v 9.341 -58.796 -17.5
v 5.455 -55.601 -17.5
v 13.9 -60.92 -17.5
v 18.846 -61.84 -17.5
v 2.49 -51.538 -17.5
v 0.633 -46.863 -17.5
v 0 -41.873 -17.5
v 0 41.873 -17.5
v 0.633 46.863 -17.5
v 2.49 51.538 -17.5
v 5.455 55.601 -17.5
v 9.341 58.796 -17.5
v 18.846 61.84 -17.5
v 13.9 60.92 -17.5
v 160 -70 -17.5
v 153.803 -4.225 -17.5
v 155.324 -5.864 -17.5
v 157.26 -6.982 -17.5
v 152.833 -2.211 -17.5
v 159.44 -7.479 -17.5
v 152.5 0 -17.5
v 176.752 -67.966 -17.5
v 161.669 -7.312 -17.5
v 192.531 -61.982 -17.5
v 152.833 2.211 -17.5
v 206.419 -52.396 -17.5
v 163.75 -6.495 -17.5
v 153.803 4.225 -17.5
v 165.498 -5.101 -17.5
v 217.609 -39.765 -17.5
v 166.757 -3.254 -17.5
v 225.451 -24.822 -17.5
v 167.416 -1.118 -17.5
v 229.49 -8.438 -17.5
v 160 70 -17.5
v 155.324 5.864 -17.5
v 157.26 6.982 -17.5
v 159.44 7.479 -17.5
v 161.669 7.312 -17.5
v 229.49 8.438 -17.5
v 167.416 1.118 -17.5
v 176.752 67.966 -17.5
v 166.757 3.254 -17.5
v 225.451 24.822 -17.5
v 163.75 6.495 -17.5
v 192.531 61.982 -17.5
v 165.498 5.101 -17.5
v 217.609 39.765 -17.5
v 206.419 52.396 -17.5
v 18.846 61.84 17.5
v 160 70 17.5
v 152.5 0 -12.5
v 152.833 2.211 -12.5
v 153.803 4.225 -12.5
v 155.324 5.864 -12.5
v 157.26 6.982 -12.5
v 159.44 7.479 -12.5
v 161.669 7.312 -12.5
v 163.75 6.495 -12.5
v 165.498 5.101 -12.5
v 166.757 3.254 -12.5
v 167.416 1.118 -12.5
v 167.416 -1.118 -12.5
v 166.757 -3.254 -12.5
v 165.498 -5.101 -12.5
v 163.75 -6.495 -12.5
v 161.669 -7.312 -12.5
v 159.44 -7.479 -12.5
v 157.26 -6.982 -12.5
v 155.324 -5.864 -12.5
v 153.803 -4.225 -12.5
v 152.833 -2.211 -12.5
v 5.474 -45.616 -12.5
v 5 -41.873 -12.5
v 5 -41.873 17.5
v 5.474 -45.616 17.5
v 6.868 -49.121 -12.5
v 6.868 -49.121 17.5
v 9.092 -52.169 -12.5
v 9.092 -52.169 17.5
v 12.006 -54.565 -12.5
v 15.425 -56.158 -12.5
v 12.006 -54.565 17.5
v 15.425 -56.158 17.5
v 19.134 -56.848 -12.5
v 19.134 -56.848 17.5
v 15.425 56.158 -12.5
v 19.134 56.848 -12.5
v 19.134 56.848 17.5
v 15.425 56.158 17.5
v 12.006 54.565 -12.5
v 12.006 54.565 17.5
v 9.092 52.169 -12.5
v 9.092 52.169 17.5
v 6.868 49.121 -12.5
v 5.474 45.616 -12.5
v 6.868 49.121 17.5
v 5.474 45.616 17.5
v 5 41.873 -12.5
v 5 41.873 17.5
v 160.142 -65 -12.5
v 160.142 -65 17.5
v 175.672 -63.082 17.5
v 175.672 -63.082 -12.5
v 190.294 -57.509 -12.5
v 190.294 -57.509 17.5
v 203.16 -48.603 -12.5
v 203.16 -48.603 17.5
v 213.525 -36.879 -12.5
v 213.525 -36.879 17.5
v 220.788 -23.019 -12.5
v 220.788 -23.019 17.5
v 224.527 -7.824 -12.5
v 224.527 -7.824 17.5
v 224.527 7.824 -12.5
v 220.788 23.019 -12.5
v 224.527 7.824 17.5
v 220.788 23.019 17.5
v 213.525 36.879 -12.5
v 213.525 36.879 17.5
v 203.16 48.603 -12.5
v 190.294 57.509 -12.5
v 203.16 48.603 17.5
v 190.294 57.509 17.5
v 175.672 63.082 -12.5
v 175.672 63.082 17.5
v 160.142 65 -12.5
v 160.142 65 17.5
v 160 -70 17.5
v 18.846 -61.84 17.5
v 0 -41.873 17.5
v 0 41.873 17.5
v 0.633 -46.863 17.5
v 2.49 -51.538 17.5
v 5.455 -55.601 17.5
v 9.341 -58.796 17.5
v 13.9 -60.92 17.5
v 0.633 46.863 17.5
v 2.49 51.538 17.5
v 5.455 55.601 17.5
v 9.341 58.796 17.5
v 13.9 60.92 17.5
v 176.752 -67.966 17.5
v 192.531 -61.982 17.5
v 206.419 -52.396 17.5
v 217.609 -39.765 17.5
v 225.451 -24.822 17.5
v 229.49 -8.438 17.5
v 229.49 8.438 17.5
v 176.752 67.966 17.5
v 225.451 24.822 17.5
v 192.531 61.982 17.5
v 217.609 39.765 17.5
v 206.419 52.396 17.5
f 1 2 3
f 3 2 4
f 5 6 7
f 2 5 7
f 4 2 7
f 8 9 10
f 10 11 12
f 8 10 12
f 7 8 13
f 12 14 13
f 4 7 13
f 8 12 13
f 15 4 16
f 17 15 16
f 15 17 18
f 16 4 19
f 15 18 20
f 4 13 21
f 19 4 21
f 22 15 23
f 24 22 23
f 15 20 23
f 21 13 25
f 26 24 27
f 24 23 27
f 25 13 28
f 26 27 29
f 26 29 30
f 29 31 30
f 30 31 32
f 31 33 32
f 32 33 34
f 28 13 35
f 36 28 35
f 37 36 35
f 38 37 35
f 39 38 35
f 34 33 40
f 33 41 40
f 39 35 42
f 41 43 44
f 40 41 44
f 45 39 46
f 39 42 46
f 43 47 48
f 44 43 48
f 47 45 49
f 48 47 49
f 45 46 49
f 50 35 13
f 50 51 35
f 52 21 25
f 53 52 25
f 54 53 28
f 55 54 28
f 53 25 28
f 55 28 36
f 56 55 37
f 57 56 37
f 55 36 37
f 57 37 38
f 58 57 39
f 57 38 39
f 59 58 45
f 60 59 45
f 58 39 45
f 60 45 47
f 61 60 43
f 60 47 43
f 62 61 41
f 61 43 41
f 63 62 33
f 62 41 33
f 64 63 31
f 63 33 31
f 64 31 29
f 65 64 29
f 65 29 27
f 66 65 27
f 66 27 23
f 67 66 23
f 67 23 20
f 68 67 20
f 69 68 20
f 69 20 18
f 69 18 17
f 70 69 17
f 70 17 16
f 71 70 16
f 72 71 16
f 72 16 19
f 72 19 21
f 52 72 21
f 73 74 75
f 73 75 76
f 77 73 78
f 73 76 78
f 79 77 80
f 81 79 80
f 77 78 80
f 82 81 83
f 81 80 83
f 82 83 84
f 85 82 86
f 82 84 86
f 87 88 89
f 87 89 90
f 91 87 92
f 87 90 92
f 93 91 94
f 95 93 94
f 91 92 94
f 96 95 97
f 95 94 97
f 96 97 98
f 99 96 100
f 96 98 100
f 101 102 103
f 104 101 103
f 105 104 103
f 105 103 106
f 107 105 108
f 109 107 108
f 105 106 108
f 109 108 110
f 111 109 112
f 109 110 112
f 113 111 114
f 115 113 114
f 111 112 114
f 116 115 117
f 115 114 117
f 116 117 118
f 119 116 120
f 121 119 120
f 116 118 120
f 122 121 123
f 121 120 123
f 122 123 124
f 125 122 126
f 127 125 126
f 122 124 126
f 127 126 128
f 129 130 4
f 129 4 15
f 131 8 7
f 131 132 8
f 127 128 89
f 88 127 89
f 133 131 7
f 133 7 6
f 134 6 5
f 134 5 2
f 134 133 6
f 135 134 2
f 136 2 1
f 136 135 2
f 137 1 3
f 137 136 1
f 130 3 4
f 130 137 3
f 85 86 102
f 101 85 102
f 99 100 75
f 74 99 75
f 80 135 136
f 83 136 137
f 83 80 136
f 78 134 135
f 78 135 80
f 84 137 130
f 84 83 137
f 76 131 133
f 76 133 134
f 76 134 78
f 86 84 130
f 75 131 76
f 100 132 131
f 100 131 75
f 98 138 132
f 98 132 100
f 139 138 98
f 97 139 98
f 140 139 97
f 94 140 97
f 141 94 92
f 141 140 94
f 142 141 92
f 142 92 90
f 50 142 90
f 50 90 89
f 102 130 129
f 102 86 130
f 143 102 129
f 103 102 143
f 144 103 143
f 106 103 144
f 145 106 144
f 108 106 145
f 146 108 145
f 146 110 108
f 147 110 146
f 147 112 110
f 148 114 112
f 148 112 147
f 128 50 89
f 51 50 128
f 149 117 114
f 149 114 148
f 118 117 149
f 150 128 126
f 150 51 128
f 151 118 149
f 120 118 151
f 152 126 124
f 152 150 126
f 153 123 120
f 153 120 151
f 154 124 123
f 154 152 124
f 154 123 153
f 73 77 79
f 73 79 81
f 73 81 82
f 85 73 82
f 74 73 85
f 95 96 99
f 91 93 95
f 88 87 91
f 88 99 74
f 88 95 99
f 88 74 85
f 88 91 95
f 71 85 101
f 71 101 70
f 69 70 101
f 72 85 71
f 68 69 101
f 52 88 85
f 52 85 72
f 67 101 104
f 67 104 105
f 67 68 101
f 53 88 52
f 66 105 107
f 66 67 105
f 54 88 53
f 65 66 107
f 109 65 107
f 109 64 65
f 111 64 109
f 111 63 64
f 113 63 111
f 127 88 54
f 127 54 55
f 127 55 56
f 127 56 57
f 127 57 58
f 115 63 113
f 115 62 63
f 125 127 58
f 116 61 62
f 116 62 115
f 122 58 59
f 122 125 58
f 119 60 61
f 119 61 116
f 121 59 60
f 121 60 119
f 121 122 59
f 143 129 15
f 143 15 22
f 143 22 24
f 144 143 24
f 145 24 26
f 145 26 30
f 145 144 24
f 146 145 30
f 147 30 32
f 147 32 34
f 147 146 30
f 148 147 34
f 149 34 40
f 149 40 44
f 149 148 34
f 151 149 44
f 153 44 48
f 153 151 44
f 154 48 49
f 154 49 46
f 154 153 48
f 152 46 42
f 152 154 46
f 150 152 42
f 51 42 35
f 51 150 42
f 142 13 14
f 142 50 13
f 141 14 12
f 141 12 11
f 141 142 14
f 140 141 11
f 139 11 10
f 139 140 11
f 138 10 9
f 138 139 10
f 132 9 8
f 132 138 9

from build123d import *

# Parameters (mm, degrees)
BOSS_EXTRUDE1_DEPTH = 17.5
CUT_EXTRUDE1_DEPTH  = 30
SKETCH6_R           = 7.5
CUT_EXTRUDE2_DEPTH  = 10


with BuildPart() as part:
    # Sketch4 → Boss-Extrude1 (new, symmetric)
    with BuildSketch(Plane.XY):
        with BuildLine():
            Line((0, 41.872855029), (0, -41.872855029))
            ThreePointArc((0, -41.872855029), (5.455474373, -55.600810969), (18.845677428, -61.839515726))
            Line((18.845677428, -61.839515726), (160, -70))
            ThreePointArc((160, -70), (230, 0), (160, 70))
            Line((160, 70), (18.845677428, 61.839515726))
            ThreePointArc((18.845677428, 61.839515726), (5.455474373, 55.600810969), (0, 41.872855029))
        make_face()
    extrude(amount=BOSS_EXTRUDE1_DEPTH, both=True)

    # Sketch5 → Cut-Extrude1 (cut)
    with BuildSketch(Plane.XY.offset(17.5)):
        with BuildLine():
            Line((160.141737643, 64.999845465), (19.134258071, 56.847850552))
            ThreePointArc((19.134258071, 56.847850552), (9.09160578, 52.168821984), (5, 41.872855029))
            Line((5, 41.872855029), (5, -41.872855029))
            ThreePointArc((5, -41.872855029), (9.09160578, -52.168821984), (19.134258071, -56.847850552))
            Line((19.134258071, -56.847850552), (160.141737643, -64.999845465))
            ThreePointArc((160.141737643, -64.999845465), (225, 0), (160.141737643, 64.999845465))
        make_face()
    extrude(amount=-CUT_EXTRUDE1_DEPTH, mode=Mode.SUBTRACT)

    # Sketch6 → Cut-Extrude2 (cut)
    with BuildSketch(Plane(origin=(0, 0, -17.5), x_dir=(-1, 0, 0), z_dir=(0, 0, -1))):
        with Locations((-160, 0)):
            Circle(SKETCH6_R)
    extrude(amount=-CUT_EXTRUDE2_DEPTH, mode=Mode.SUBTRACT)


solid = part.part
